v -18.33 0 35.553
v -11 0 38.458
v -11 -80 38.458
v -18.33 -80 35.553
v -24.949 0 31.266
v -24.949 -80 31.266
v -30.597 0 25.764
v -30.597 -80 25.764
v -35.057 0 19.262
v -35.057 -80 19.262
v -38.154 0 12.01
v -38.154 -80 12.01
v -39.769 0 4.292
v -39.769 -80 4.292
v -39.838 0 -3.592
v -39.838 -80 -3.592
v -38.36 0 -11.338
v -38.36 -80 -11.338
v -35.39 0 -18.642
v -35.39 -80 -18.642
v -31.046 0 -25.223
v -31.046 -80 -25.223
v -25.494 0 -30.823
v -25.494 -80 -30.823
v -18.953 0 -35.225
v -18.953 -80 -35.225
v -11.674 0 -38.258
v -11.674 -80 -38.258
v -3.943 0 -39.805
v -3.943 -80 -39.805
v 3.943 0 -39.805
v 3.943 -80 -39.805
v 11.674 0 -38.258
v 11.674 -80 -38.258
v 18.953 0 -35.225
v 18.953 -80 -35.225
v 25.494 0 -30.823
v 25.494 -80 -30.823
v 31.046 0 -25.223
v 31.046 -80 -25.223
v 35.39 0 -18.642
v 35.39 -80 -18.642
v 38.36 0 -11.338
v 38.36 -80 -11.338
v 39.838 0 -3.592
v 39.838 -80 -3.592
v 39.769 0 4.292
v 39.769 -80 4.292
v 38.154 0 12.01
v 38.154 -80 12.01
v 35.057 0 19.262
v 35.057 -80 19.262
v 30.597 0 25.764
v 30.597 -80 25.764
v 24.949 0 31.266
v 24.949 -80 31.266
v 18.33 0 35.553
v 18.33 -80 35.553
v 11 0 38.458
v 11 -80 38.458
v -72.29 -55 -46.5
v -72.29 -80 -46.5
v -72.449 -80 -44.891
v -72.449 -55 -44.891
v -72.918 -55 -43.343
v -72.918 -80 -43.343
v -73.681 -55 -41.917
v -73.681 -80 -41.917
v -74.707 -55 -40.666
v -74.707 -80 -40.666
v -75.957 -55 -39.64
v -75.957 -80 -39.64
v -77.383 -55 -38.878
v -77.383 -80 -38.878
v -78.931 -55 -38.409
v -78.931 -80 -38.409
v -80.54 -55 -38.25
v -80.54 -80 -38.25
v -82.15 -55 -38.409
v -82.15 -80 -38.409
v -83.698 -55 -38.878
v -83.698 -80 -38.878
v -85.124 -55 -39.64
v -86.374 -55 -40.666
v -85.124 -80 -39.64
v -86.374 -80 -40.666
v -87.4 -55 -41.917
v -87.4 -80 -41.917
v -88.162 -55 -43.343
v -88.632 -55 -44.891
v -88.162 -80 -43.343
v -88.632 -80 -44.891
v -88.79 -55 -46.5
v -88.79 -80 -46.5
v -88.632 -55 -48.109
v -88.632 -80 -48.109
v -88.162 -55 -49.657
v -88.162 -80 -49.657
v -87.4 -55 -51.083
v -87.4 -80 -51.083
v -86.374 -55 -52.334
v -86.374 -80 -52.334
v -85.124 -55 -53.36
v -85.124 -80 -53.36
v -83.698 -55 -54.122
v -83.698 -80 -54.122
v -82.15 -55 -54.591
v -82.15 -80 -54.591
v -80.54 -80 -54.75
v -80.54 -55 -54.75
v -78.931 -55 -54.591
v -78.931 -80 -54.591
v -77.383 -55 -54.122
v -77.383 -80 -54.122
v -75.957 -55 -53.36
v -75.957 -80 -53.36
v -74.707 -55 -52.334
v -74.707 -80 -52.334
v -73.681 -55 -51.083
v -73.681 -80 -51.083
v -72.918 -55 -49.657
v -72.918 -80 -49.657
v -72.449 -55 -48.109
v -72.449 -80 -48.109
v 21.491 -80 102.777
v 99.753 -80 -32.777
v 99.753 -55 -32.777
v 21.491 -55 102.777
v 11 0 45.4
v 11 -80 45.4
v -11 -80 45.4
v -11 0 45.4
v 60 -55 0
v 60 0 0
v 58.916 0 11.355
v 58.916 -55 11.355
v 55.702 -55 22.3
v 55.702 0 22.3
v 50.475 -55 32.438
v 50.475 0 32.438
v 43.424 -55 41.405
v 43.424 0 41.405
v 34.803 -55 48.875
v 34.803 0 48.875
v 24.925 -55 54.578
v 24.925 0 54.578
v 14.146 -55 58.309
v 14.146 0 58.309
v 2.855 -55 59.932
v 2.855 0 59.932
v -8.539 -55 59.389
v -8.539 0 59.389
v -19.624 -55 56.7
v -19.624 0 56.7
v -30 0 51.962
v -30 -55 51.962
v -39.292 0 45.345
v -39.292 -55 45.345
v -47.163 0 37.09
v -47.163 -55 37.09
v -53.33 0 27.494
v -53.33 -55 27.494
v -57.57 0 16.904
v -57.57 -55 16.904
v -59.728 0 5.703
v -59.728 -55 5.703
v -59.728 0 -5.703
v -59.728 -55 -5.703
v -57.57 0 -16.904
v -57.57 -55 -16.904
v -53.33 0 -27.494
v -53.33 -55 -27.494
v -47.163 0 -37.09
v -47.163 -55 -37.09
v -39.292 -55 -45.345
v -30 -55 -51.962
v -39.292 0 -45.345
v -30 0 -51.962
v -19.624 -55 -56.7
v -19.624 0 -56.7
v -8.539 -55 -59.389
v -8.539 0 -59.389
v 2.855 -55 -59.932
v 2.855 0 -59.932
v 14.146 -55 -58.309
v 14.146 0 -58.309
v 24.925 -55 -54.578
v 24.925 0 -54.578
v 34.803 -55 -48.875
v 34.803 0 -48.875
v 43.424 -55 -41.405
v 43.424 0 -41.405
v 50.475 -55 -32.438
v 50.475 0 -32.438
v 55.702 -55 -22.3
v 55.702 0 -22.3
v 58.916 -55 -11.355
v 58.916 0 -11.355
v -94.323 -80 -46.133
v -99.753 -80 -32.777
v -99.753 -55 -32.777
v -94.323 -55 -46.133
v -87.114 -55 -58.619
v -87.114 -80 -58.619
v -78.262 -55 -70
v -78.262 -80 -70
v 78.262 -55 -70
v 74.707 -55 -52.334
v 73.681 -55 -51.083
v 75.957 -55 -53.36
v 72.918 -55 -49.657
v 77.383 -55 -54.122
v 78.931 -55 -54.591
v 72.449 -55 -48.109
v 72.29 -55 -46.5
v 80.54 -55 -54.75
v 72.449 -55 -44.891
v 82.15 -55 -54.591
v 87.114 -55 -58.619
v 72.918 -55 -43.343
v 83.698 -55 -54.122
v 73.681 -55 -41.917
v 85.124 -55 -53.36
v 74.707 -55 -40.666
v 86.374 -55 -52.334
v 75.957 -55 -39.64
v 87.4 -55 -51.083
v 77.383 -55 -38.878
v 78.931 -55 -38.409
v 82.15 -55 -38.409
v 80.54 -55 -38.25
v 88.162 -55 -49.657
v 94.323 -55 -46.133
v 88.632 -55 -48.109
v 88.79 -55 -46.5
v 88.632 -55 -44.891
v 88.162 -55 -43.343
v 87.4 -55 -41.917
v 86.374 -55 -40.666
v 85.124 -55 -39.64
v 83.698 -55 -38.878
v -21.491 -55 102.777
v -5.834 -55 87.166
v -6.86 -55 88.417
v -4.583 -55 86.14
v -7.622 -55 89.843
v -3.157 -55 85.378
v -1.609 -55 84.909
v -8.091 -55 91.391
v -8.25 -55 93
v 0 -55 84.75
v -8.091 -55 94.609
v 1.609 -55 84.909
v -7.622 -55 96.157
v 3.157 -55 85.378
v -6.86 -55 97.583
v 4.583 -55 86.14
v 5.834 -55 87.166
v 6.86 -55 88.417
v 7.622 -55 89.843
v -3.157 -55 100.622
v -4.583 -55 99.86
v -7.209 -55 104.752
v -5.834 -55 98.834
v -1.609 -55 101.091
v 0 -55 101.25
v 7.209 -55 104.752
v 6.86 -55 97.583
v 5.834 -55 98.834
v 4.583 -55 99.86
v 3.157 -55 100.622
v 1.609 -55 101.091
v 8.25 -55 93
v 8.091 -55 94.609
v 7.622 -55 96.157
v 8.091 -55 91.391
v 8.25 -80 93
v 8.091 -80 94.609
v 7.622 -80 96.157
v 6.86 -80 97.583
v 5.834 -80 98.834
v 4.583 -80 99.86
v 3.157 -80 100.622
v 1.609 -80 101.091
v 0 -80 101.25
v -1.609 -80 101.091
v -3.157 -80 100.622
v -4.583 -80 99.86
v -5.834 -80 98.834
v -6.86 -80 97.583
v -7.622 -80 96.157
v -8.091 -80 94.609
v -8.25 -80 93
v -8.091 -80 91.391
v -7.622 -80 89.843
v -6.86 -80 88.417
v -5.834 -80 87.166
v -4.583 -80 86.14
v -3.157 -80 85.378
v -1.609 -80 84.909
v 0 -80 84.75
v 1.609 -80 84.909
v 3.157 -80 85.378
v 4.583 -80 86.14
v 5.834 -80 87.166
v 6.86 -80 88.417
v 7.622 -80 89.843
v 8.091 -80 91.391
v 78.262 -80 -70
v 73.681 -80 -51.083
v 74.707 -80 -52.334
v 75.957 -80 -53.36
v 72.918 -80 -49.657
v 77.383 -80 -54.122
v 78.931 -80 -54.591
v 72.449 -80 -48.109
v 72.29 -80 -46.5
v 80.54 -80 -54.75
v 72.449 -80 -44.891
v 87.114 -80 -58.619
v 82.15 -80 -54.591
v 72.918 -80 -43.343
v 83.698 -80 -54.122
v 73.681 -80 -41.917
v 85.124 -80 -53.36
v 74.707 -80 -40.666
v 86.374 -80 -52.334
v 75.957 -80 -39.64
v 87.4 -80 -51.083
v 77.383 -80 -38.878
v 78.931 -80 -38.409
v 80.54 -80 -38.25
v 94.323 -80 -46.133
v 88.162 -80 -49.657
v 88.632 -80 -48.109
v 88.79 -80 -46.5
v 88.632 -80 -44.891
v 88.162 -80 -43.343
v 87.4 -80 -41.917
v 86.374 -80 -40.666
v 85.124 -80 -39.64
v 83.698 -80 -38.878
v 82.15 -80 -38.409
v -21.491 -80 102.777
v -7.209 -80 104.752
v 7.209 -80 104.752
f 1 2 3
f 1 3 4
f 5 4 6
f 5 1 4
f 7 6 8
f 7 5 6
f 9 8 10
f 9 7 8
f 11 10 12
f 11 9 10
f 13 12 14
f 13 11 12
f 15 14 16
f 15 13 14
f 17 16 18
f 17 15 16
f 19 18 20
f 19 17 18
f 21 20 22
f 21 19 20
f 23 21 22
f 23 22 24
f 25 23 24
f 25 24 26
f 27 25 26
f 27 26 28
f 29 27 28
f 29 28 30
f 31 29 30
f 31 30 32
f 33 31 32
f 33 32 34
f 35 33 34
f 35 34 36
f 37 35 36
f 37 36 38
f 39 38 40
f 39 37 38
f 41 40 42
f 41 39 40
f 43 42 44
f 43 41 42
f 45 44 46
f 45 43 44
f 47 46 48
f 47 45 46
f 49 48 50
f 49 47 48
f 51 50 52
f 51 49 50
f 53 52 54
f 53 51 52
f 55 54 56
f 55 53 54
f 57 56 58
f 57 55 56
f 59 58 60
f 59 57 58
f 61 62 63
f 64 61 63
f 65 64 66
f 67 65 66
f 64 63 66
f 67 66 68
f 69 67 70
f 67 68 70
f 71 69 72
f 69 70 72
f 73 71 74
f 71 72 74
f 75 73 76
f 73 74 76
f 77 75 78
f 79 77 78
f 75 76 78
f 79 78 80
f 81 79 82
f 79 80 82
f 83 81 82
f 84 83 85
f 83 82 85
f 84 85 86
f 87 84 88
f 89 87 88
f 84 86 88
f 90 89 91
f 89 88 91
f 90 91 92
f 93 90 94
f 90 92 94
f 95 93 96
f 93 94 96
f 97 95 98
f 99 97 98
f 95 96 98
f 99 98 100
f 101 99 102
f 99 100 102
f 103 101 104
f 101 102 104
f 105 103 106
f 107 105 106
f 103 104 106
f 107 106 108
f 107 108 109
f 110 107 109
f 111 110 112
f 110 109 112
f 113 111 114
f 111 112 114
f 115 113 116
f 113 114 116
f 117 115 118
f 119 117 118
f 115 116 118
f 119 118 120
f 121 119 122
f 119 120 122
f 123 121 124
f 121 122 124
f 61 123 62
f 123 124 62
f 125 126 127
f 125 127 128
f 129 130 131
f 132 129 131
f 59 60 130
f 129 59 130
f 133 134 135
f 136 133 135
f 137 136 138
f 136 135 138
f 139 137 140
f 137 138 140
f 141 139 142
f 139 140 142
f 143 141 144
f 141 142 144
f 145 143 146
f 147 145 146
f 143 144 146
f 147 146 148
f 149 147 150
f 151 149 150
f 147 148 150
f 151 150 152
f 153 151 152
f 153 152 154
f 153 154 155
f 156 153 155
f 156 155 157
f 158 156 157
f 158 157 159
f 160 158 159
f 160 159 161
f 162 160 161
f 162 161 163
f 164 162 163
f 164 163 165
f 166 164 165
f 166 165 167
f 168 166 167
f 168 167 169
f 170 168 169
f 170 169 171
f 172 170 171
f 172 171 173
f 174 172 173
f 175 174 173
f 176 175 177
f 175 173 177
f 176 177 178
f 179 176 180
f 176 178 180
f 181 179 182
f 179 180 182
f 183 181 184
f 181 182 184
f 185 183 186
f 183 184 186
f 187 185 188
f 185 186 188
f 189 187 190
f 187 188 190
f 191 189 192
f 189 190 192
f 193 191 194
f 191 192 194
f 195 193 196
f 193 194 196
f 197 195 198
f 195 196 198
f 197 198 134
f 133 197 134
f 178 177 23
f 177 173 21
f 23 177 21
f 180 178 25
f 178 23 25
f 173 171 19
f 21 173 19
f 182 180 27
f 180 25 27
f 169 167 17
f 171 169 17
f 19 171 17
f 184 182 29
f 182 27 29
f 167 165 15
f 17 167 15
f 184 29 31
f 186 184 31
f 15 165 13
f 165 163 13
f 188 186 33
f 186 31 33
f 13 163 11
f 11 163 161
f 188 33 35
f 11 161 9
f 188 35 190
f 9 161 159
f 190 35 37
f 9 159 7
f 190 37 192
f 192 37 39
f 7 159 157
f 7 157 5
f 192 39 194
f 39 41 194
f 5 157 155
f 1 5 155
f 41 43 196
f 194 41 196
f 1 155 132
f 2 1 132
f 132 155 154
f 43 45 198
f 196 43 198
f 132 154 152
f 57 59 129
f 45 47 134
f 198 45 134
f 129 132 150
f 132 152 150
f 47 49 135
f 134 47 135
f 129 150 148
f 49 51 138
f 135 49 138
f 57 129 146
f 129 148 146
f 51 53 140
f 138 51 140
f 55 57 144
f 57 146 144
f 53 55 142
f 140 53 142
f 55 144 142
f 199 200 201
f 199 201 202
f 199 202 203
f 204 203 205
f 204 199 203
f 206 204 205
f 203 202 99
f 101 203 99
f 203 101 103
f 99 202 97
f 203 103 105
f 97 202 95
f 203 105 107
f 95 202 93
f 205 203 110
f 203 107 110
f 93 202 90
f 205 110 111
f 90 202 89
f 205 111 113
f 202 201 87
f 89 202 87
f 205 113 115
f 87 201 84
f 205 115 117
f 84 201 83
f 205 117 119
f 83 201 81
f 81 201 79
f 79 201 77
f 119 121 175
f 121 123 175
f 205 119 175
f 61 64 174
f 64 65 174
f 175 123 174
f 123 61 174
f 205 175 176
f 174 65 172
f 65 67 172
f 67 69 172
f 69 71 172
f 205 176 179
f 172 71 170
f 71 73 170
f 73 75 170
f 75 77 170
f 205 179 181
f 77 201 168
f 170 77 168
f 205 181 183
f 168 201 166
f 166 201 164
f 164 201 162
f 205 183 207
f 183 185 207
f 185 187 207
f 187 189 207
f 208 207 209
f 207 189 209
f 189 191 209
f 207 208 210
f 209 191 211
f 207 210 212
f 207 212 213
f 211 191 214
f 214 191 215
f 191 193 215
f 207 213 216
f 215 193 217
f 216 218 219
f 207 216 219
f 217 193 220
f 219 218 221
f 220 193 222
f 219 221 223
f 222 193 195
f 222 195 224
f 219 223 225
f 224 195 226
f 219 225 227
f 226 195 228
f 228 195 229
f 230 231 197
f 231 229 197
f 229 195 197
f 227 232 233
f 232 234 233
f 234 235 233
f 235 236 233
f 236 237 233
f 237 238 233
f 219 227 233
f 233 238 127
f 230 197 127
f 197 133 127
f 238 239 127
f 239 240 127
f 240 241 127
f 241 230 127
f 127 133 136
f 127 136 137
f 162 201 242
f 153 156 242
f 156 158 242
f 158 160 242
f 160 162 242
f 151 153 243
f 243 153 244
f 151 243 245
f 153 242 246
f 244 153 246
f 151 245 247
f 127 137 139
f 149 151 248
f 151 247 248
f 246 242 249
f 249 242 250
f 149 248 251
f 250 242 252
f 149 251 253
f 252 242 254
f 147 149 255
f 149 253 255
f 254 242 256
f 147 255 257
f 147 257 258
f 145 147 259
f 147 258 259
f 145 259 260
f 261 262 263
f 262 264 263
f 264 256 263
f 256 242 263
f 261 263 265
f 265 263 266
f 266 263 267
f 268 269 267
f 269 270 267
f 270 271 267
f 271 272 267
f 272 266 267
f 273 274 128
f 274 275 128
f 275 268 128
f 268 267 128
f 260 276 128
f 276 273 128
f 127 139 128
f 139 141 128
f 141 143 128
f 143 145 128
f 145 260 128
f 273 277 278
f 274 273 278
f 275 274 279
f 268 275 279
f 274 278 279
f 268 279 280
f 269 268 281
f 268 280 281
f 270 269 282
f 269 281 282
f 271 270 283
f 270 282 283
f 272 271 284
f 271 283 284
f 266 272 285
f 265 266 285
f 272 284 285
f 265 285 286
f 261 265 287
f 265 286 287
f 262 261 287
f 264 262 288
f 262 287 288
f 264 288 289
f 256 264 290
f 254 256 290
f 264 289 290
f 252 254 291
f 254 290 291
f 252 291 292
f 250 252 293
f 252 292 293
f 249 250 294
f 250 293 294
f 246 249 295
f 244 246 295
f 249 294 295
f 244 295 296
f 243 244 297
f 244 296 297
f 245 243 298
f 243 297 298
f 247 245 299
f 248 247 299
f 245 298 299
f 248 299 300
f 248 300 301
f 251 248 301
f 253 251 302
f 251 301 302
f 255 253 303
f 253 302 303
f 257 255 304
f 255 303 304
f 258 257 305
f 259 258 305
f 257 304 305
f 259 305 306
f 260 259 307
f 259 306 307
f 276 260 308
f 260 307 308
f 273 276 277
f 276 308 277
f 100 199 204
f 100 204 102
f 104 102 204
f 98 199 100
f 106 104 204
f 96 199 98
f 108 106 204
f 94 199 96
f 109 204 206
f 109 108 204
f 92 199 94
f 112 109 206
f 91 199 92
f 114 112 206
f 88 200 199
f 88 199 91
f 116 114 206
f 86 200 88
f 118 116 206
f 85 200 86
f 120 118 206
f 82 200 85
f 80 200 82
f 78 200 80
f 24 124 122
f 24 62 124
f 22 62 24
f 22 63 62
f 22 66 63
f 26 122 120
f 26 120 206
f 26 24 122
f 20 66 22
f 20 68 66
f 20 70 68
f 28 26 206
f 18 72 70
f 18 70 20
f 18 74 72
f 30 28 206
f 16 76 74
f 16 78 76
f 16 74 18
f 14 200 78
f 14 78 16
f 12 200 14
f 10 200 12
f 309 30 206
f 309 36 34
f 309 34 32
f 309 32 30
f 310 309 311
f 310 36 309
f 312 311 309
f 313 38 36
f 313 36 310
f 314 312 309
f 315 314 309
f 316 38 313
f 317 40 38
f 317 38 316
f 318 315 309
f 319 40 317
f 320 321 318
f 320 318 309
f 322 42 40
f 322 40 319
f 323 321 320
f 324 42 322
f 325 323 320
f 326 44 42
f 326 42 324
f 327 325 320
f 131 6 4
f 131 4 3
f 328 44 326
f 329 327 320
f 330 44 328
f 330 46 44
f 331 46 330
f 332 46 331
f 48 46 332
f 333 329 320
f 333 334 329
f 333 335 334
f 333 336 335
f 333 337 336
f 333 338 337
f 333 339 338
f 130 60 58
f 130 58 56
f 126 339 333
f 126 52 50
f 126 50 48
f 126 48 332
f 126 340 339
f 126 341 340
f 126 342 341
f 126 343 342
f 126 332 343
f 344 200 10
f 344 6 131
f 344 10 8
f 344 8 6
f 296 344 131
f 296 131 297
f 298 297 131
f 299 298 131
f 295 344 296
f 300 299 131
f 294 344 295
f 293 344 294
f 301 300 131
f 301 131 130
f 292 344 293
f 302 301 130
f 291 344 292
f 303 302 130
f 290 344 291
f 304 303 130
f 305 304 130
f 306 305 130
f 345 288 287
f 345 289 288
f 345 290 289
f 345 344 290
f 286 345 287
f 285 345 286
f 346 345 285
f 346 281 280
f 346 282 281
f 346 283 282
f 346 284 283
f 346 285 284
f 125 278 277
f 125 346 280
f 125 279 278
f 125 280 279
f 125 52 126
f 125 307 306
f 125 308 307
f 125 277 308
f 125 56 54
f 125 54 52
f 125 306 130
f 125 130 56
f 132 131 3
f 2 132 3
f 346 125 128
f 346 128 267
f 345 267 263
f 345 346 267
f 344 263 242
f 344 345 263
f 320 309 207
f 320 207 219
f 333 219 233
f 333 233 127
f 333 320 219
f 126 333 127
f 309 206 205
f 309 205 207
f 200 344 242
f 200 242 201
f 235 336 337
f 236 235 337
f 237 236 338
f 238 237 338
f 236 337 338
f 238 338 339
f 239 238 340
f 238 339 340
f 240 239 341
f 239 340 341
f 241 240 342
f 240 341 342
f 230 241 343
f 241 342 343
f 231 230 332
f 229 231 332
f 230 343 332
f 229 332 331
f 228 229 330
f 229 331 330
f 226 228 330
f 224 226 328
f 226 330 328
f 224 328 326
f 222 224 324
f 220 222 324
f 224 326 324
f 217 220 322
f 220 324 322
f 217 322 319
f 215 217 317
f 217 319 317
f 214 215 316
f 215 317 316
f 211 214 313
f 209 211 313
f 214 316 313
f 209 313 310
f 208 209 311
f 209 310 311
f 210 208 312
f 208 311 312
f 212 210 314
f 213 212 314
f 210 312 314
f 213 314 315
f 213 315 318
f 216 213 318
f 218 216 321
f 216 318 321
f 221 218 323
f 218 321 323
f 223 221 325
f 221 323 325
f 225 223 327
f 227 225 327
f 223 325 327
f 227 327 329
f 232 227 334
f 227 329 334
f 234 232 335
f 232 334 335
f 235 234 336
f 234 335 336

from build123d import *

# Parameters (mm, degrees)
F0_R     = 60
F0_R_2   = 40
F1_DEPTH = 80
F2_R     = 8.25
F2_R_2   = 60
F3_DEPTH = 25
F5_DEPTH = 80.001


with BuildPart() as f1:
    # F0 (on Front) → F1 (new body)
    with BuildSketch(Plane.XZ):
        Circle(F0_R)
        Circle(F0_R_2, mode=Mode.SUBTRACT)
    extrude(amount=F1_DEPTH)

    # F2 (on face) → F3 (join)
    with BuildSketch(Plane.XZ.offset(80)):
        with BuildLine():
            Line((99.752968, -32.777209), (21.490589, 102.777209))
            ThreePointArc((21.490589, 102.777209), (0, 105), (-21.490589, 102.777209))
            Line((-21.490589, 102.777209), (-99.752968, -32.777209))
            ThreePointArc((-99.752968, -32.777209), (-90.932667, -52.5), (-78.262379, -70))
            Line((-78.262379, -70), (78.262379, -70))
            ThreePointArc((78.262379, -70), (90.932667, -52.5), (99.752968, -32.777209))
        make_face()
        with Locations((-80.540363, -46.5)):
            Circle(F2_R, mode=Mode.SUBTRACT)
        with Locations((80.540363, -46.5)):
            Circle(F2_R, mode=Mode.SUBTRACT)
        Circle(F2_R_2, mode=Mode.SUBTRACT)
        with Locations((0, 93)):
            Circle(F2_R, mode=Mode.SUBTRACT)
    extrude(amount=-F3_DEPTH)

    # F4 (on face) → F5 (cut, through all)
    with BuildSketch(Plane.XZ.offset(80)):
        with BuildLine():
            Line((11, 45.4), (-11, 45.4))
            Line((-11, 45.4), (-11, 38.457769))
            ThreePointArc((-11, 38.457769), (0, 40), (11, 38.457769))
            Line((11, 38.457769), (11, 45.4))
        make_face()
    extrude(amount=-F5_DEPTH, mode=Mode.SUBTRACT)


solid = f1.part
